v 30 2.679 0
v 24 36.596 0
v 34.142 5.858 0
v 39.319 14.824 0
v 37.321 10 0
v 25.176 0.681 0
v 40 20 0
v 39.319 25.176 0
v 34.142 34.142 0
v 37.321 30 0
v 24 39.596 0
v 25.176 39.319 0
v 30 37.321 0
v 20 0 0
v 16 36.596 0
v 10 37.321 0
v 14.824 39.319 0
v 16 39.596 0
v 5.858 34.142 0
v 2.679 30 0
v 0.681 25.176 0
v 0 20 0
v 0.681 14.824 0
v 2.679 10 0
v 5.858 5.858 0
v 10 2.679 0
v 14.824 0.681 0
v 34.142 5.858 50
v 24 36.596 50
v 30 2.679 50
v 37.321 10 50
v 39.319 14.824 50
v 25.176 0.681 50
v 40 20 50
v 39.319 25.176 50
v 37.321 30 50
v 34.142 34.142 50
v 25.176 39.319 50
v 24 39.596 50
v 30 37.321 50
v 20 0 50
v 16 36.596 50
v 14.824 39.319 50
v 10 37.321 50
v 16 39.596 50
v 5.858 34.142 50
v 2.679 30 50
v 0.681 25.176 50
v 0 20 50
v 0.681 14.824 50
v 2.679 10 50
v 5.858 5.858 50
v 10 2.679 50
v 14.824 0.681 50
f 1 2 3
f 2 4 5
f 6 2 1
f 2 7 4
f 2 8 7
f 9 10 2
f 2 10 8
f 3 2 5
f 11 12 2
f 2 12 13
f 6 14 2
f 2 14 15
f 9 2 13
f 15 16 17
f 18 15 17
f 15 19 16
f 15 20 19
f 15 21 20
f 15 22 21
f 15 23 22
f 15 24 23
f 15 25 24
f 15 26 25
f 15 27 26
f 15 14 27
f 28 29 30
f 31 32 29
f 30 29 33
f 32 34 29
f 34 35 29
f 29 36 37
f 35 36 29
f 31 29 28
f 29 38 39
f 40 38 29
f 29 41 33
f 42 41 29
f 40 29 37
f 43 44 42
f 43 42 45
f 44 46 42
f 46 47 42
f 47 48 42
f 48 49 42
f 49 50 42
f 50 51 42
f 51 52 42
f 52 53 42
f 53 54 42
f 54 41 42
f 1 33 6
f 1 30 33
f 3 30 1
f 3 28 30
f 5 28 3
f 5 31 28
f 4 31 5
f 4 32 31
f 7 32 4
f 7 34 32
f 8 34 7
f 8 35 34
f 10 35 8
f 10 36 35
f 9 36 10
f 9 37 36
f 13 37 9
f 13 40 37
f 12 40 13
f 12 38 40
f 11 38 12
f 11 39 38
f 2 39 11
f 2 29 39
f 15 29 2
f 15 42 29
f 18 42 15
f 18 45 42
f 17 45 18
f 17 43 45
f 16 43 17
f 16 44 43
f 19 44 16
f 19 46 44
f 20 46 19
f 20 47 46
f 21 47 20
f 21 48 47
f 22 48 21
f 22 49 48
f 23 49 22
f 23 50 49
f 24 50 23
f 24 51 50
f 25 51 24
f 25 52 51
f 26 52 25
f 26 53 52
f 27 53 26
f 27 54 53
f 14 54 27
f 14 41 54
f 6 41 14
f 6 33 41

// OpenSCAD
$fn = 32;

// ----------------------------------------------------------------------
// Keyway shaft: d40 shaft, key 8 x 3 mm
// ----------------------------------------------------------------------

// --- parameters (mm) ---
shaft_r = 20;             // shaft radius
key_w = 8;                // keyway width
key_d = 3;                // keyway depth below the surface line
plate_t = 50;             // shaft length, Z (extrusion height)

shaft_d = 2 * shaft_r;  // shaft diameter
circle_step = 15;  // polygon sampling step, degrees

profile = [[14.824, 39.319], [10, 37.321], [5.858, 34.142], [2.679, 30], [0.681, 25.176], [0, 20], [0.681, 14.824], [2.679, 10], [5.858, 5.858], [10, 2.679], [14.824, 0.681], [20, 0], [25.176, 0.681], [30, 2.679], [34.142, 5.858], [37.321, 10], [39.319, 14.824], [40, 20], [39.319, 25.176], [37.321, 30], [34.142, 34.142], [30, 37.321], [25.176, 39.319], [24, 39.596], [24, 36.596], [16, 36.596], [16, 39.596]];  // primary outline, 27 points, counter clockwise

// --- the one profile operation ---
linear_extrude(height = plate_t) polygon(points = profile);
